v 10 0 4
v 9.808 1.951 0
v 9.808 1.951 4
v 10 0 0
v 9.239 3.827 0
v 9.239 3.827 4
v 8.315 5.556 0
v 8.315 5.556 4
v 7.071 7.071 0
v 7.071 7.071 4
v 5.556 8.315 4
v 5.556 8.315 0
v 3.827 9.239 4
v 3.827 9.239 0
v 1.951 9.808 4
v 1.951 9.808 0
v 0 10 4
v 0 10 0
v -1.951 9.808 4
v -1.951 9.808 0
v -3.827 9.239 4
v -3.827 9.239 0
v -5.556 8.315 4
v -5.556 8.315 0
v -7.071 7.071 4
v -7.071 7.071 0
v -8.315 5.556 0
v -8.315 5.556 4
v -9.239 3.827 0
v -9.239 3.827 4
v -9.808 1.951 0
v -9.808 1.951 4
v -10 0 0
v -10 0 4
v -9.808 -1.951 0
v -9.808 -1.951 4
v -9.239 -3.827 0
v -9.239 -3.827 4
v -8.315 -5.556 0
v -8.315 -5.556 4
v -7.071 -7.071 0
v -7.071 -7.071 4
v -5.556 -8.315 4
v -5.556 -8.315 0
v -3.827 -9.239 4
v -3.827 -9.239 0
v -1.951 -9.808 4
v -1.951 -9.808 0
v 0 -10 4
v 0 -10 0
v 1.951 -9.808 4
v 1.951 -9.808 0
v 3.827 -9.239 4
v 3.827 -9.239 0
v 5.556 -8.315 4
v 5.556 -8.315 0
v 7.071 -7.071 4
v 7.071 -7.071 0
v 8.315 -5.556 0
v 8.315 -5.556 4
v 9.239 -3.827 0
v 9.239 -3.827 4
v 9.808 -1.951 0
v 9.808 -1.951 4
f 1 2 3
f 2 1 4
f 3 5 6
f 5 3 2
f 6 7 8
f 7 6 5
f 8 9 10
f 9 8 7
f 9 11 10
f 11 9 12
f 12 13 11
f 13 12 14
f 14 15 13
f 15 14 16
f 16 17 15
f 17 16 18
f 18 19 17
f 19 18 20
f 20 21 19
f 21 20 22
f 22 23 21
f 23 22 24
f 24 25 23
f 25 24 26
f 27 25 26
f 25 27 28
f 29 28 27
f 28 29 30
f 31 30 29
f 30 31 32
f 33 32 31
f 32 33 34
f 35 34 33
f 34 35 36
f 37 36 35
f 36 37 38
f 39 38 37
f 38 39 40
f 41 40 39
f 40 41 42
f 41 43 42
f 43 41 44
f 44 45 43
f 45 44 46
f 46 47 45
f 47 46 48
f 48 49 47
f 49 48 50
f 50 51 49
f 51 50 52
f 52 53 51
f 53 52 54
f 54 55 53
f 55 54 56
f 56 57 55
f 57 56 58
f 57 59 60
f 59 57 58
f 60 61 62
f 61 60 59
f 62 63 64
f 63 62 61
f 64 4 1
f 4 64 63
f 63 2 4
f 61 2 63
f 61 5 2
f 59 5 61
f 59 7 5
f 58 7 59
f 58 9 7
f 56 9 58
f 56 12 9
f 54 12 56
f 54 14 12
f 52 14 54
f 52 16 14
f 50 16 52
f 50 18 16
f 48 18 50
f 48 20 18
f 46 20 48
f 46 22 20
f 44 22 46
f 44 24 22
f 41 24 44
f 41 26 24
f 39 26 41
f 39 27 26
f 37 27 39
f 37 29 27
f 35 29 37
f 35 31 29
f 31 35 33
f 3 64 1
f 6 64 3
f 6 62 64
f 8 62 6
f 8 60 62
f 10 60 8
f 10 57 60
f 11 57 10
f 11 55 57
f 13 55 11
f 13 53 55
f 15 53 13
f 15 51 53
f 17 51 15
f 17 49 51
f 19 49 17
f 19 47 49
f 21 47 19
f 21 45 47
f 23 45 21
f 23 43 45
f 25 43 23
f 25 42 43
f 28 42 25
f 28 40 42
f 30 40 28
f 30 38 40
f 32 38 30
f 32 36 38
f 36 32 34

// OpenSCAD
module MKS_holder() {
    difference() {
        union() {
            cylinder(d=20, h=4, $fn=32);
        }
    }
}

MKS_holder();
